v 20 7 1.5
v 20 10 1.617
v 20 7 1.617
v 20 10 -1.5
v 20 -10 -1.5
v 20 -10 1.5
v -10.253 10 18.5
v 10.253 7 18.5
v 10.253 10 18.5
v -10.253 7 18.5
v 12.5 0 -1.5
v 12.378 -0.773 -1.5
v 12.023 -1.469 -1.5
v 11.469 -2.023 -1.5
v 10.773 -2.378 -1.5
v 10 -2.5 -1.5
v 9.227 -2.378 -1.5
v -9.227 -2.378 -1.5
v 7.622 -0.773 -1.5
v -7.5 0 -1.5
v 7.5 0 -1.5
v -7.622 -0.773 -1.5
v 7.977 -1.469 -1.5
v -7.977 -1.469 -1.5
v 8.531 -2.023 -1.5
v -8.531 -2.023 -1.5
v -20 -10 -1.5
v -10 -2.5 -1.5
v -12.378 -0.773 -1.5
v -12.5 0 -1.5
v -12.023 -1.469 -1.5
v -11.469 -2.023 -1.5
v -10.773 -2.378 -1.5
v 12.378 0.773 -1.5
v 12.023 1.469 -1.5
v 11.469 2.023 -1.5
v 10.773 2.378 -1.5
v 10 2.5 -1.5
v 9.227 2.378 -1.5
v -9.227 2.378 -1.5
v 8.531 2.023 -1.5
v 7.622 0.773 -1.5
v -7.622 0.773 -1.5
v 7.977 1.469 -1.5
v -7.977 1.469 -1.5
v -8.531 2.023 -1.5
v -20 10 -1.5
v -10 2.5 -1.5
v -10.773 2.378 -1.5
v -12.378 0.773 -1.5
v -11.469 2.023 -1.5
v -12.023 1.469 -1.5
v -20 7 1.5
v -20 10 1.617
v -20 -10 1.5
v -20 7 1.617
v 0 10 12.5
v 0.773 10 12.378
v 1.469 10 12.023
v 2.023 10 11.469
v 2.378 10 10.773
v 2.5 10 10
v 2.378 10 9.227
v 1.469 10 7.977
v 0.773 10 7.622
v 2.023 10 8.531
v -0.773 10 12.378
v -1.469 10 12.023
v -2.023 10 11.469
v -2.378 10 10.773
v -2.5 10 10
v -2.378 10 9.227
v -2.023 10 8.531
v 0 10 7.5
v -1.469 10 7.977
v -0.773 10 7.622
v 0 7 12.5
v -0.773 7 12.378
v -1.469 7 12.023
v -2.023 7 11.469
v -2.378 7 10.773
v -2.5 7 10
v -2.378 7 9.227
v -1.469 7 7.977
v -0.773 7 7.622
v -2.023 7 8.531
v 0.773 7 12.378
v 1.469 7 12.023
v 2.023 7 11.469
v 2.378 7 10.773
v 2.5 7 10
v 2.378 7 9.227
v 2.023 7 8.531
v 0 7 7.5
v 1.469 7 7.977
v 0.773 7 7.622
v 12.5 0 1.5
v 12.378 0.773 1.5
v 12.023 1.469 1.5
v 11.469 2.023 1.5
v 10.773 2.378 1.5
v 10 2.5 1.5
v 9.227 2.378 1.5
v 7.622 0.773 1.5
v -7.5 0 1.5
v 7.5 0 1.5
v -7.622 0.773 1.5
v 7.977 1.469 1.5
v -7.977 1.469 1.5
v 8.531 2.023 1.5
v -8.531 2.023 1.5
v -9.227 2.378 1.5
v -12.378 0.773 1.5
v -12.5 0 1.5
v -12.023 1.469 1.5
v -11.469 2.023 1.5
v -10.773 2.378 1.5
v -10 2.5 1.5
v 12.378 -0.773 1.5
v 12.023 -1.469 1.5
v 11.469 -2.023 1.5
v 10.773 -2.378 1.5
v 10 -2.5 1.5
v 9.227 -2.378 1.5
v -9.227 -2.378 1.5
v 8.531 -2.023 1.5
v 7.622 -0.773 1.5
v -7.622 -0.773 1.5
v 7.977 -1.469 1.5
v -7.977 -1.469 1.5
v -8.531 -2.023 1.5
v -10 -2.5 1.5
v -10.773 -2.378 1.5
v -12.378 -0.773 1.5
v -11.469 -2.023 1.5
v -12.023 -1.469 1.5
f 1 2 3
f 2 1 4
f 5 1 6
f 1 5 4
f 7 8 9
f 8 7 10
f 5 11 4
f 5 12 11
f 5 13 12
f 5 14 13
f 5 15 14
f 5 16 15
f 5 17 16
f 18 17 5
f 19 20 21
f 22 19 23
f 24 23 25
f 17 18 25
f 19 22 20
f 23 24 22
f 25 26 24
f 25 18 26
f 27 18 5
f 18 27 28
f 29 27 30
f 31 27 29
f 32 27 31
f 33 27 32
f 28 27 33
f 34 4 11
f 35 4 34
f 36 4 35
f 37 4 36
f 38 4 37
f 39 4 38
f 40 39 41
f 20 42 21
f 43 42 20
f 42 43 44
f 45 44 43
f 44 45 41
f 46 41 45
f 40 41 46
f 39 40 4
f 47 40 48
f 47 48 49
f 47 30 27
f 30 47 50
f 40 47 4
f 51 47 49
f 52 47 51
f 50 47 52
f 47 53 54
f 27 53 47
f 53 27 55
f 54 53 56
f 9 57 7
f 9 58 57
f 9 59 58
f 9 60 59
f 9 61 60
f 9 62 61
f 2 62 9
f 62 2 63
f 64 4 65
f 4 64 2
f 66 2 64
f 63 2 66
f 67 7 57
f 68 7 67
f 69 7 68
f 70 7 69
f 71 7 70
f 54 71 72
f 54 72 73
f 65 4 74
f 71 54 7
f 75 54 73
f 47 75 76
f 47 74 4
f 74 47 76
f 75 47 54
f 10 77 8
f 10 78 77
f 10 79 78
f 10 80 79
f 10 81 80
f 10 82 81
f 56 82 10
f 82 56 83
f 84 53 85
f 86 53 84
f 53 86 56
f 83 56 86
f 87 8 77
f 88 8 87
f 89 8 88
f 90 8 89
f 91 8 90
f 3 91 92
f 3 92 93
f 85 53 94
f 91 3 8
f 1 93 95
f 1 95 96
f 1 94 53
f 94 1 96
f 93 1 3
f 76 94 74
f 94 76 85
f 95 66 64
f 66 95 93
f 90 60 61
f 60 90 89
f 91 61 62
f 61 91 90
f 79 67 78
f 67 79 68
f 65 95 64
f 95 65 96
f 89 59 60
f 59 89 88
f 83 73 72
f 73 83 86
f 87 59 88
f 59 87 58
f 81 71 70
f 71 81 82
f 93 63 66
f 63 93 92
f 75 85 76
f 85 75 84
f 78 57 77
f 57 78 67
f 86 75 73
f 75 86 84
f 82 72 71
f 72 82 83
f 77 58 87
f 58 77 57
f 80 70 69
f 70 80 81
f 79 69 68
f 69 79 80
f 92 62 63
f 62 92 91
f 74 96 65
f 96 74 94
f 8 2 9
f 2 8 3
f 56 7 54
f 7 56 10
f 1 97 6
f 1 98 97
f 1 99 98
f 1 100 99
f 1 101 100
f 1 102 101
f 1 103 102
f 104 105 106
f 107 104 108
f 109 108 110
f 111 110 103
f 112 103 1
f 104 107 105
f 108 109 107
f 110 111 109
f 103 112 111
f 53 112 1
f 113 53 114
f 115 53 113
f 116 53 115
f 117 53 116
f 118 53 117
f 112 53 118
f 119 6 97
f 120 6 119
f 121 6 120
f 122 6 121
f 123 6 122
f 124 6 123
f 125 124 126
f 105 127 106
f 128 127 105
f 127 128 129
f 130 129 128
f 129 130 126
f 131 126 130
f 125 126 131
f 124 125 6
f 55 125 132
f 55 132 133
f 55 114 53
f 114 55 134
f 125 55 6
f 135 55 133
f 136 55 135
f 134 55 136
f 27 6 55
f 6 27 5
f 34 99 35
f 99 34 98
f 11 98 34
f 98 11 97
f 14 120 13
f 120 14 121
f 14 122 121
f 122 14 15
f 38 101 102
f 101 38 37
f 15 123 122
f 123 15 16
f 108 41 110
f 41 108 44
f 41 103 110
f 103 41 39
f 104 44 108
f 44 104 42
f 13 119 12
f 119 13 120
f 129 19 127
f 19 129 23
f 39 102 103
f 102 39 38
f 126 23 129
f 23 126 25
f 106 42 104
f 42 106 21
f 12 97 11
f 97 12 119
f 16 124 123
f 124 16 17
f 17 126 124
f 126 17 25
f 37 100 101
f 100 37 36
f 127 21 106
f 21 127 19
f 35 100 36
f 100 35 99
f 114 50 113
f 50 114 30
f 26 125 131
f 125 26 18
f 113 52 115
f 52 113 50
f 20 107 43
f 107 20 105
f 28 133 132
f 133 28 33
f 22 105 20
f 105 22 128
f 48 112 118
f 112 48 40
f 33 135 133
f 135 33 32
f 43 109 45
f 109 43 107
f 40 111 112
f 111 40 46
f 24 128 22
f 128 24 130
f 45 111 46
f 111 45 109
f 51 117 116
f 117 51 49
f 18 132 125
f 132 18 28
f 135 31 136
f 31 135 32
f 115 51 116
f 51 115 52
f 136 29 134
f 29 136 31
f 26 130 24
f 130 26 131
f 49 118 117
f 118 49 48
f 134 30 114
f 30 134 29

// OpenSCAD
//Autor: Martín Cancio Barrera, UO287561

baseX = 40;
baseY = 3;
baseZ = 20;

verticalX = 40;
verticalY = 20;
verticalZ = 3;

module 1X2AB(){
    difference(){   
        translate([0, verticalY / 2 - verticalZ / 2, verticalY / 2 - baseY / 2])
        cube([baseX,baseY,baseZ], center = true);
        
        rotate([90,0,0])
        translate([0,verticalY / 2,0])
        cylinder(h = 30, r = 2.5, $fn = 20, center = true);
        
        ramp();
        
        mirror([1,0,0])
        ramp();
    }
    
    difference(){
        cube([verticalX,verticalY,verticalZ], center = true);
    
        baseHole();
        
        mirror([1,0,0])
        baseHole();
    }
}

module baseHole(){
    translate([baseX / 2 - 7.5 - 2.5, 0, 0])
    cylinder(h = 10, r = 2.5, $fn = 20, center = true);
}

module ramp(){
    translate([6.5,0,25])
    rotate([0,60,0])
    cube([40,20,20]);
}

1X2AB();
